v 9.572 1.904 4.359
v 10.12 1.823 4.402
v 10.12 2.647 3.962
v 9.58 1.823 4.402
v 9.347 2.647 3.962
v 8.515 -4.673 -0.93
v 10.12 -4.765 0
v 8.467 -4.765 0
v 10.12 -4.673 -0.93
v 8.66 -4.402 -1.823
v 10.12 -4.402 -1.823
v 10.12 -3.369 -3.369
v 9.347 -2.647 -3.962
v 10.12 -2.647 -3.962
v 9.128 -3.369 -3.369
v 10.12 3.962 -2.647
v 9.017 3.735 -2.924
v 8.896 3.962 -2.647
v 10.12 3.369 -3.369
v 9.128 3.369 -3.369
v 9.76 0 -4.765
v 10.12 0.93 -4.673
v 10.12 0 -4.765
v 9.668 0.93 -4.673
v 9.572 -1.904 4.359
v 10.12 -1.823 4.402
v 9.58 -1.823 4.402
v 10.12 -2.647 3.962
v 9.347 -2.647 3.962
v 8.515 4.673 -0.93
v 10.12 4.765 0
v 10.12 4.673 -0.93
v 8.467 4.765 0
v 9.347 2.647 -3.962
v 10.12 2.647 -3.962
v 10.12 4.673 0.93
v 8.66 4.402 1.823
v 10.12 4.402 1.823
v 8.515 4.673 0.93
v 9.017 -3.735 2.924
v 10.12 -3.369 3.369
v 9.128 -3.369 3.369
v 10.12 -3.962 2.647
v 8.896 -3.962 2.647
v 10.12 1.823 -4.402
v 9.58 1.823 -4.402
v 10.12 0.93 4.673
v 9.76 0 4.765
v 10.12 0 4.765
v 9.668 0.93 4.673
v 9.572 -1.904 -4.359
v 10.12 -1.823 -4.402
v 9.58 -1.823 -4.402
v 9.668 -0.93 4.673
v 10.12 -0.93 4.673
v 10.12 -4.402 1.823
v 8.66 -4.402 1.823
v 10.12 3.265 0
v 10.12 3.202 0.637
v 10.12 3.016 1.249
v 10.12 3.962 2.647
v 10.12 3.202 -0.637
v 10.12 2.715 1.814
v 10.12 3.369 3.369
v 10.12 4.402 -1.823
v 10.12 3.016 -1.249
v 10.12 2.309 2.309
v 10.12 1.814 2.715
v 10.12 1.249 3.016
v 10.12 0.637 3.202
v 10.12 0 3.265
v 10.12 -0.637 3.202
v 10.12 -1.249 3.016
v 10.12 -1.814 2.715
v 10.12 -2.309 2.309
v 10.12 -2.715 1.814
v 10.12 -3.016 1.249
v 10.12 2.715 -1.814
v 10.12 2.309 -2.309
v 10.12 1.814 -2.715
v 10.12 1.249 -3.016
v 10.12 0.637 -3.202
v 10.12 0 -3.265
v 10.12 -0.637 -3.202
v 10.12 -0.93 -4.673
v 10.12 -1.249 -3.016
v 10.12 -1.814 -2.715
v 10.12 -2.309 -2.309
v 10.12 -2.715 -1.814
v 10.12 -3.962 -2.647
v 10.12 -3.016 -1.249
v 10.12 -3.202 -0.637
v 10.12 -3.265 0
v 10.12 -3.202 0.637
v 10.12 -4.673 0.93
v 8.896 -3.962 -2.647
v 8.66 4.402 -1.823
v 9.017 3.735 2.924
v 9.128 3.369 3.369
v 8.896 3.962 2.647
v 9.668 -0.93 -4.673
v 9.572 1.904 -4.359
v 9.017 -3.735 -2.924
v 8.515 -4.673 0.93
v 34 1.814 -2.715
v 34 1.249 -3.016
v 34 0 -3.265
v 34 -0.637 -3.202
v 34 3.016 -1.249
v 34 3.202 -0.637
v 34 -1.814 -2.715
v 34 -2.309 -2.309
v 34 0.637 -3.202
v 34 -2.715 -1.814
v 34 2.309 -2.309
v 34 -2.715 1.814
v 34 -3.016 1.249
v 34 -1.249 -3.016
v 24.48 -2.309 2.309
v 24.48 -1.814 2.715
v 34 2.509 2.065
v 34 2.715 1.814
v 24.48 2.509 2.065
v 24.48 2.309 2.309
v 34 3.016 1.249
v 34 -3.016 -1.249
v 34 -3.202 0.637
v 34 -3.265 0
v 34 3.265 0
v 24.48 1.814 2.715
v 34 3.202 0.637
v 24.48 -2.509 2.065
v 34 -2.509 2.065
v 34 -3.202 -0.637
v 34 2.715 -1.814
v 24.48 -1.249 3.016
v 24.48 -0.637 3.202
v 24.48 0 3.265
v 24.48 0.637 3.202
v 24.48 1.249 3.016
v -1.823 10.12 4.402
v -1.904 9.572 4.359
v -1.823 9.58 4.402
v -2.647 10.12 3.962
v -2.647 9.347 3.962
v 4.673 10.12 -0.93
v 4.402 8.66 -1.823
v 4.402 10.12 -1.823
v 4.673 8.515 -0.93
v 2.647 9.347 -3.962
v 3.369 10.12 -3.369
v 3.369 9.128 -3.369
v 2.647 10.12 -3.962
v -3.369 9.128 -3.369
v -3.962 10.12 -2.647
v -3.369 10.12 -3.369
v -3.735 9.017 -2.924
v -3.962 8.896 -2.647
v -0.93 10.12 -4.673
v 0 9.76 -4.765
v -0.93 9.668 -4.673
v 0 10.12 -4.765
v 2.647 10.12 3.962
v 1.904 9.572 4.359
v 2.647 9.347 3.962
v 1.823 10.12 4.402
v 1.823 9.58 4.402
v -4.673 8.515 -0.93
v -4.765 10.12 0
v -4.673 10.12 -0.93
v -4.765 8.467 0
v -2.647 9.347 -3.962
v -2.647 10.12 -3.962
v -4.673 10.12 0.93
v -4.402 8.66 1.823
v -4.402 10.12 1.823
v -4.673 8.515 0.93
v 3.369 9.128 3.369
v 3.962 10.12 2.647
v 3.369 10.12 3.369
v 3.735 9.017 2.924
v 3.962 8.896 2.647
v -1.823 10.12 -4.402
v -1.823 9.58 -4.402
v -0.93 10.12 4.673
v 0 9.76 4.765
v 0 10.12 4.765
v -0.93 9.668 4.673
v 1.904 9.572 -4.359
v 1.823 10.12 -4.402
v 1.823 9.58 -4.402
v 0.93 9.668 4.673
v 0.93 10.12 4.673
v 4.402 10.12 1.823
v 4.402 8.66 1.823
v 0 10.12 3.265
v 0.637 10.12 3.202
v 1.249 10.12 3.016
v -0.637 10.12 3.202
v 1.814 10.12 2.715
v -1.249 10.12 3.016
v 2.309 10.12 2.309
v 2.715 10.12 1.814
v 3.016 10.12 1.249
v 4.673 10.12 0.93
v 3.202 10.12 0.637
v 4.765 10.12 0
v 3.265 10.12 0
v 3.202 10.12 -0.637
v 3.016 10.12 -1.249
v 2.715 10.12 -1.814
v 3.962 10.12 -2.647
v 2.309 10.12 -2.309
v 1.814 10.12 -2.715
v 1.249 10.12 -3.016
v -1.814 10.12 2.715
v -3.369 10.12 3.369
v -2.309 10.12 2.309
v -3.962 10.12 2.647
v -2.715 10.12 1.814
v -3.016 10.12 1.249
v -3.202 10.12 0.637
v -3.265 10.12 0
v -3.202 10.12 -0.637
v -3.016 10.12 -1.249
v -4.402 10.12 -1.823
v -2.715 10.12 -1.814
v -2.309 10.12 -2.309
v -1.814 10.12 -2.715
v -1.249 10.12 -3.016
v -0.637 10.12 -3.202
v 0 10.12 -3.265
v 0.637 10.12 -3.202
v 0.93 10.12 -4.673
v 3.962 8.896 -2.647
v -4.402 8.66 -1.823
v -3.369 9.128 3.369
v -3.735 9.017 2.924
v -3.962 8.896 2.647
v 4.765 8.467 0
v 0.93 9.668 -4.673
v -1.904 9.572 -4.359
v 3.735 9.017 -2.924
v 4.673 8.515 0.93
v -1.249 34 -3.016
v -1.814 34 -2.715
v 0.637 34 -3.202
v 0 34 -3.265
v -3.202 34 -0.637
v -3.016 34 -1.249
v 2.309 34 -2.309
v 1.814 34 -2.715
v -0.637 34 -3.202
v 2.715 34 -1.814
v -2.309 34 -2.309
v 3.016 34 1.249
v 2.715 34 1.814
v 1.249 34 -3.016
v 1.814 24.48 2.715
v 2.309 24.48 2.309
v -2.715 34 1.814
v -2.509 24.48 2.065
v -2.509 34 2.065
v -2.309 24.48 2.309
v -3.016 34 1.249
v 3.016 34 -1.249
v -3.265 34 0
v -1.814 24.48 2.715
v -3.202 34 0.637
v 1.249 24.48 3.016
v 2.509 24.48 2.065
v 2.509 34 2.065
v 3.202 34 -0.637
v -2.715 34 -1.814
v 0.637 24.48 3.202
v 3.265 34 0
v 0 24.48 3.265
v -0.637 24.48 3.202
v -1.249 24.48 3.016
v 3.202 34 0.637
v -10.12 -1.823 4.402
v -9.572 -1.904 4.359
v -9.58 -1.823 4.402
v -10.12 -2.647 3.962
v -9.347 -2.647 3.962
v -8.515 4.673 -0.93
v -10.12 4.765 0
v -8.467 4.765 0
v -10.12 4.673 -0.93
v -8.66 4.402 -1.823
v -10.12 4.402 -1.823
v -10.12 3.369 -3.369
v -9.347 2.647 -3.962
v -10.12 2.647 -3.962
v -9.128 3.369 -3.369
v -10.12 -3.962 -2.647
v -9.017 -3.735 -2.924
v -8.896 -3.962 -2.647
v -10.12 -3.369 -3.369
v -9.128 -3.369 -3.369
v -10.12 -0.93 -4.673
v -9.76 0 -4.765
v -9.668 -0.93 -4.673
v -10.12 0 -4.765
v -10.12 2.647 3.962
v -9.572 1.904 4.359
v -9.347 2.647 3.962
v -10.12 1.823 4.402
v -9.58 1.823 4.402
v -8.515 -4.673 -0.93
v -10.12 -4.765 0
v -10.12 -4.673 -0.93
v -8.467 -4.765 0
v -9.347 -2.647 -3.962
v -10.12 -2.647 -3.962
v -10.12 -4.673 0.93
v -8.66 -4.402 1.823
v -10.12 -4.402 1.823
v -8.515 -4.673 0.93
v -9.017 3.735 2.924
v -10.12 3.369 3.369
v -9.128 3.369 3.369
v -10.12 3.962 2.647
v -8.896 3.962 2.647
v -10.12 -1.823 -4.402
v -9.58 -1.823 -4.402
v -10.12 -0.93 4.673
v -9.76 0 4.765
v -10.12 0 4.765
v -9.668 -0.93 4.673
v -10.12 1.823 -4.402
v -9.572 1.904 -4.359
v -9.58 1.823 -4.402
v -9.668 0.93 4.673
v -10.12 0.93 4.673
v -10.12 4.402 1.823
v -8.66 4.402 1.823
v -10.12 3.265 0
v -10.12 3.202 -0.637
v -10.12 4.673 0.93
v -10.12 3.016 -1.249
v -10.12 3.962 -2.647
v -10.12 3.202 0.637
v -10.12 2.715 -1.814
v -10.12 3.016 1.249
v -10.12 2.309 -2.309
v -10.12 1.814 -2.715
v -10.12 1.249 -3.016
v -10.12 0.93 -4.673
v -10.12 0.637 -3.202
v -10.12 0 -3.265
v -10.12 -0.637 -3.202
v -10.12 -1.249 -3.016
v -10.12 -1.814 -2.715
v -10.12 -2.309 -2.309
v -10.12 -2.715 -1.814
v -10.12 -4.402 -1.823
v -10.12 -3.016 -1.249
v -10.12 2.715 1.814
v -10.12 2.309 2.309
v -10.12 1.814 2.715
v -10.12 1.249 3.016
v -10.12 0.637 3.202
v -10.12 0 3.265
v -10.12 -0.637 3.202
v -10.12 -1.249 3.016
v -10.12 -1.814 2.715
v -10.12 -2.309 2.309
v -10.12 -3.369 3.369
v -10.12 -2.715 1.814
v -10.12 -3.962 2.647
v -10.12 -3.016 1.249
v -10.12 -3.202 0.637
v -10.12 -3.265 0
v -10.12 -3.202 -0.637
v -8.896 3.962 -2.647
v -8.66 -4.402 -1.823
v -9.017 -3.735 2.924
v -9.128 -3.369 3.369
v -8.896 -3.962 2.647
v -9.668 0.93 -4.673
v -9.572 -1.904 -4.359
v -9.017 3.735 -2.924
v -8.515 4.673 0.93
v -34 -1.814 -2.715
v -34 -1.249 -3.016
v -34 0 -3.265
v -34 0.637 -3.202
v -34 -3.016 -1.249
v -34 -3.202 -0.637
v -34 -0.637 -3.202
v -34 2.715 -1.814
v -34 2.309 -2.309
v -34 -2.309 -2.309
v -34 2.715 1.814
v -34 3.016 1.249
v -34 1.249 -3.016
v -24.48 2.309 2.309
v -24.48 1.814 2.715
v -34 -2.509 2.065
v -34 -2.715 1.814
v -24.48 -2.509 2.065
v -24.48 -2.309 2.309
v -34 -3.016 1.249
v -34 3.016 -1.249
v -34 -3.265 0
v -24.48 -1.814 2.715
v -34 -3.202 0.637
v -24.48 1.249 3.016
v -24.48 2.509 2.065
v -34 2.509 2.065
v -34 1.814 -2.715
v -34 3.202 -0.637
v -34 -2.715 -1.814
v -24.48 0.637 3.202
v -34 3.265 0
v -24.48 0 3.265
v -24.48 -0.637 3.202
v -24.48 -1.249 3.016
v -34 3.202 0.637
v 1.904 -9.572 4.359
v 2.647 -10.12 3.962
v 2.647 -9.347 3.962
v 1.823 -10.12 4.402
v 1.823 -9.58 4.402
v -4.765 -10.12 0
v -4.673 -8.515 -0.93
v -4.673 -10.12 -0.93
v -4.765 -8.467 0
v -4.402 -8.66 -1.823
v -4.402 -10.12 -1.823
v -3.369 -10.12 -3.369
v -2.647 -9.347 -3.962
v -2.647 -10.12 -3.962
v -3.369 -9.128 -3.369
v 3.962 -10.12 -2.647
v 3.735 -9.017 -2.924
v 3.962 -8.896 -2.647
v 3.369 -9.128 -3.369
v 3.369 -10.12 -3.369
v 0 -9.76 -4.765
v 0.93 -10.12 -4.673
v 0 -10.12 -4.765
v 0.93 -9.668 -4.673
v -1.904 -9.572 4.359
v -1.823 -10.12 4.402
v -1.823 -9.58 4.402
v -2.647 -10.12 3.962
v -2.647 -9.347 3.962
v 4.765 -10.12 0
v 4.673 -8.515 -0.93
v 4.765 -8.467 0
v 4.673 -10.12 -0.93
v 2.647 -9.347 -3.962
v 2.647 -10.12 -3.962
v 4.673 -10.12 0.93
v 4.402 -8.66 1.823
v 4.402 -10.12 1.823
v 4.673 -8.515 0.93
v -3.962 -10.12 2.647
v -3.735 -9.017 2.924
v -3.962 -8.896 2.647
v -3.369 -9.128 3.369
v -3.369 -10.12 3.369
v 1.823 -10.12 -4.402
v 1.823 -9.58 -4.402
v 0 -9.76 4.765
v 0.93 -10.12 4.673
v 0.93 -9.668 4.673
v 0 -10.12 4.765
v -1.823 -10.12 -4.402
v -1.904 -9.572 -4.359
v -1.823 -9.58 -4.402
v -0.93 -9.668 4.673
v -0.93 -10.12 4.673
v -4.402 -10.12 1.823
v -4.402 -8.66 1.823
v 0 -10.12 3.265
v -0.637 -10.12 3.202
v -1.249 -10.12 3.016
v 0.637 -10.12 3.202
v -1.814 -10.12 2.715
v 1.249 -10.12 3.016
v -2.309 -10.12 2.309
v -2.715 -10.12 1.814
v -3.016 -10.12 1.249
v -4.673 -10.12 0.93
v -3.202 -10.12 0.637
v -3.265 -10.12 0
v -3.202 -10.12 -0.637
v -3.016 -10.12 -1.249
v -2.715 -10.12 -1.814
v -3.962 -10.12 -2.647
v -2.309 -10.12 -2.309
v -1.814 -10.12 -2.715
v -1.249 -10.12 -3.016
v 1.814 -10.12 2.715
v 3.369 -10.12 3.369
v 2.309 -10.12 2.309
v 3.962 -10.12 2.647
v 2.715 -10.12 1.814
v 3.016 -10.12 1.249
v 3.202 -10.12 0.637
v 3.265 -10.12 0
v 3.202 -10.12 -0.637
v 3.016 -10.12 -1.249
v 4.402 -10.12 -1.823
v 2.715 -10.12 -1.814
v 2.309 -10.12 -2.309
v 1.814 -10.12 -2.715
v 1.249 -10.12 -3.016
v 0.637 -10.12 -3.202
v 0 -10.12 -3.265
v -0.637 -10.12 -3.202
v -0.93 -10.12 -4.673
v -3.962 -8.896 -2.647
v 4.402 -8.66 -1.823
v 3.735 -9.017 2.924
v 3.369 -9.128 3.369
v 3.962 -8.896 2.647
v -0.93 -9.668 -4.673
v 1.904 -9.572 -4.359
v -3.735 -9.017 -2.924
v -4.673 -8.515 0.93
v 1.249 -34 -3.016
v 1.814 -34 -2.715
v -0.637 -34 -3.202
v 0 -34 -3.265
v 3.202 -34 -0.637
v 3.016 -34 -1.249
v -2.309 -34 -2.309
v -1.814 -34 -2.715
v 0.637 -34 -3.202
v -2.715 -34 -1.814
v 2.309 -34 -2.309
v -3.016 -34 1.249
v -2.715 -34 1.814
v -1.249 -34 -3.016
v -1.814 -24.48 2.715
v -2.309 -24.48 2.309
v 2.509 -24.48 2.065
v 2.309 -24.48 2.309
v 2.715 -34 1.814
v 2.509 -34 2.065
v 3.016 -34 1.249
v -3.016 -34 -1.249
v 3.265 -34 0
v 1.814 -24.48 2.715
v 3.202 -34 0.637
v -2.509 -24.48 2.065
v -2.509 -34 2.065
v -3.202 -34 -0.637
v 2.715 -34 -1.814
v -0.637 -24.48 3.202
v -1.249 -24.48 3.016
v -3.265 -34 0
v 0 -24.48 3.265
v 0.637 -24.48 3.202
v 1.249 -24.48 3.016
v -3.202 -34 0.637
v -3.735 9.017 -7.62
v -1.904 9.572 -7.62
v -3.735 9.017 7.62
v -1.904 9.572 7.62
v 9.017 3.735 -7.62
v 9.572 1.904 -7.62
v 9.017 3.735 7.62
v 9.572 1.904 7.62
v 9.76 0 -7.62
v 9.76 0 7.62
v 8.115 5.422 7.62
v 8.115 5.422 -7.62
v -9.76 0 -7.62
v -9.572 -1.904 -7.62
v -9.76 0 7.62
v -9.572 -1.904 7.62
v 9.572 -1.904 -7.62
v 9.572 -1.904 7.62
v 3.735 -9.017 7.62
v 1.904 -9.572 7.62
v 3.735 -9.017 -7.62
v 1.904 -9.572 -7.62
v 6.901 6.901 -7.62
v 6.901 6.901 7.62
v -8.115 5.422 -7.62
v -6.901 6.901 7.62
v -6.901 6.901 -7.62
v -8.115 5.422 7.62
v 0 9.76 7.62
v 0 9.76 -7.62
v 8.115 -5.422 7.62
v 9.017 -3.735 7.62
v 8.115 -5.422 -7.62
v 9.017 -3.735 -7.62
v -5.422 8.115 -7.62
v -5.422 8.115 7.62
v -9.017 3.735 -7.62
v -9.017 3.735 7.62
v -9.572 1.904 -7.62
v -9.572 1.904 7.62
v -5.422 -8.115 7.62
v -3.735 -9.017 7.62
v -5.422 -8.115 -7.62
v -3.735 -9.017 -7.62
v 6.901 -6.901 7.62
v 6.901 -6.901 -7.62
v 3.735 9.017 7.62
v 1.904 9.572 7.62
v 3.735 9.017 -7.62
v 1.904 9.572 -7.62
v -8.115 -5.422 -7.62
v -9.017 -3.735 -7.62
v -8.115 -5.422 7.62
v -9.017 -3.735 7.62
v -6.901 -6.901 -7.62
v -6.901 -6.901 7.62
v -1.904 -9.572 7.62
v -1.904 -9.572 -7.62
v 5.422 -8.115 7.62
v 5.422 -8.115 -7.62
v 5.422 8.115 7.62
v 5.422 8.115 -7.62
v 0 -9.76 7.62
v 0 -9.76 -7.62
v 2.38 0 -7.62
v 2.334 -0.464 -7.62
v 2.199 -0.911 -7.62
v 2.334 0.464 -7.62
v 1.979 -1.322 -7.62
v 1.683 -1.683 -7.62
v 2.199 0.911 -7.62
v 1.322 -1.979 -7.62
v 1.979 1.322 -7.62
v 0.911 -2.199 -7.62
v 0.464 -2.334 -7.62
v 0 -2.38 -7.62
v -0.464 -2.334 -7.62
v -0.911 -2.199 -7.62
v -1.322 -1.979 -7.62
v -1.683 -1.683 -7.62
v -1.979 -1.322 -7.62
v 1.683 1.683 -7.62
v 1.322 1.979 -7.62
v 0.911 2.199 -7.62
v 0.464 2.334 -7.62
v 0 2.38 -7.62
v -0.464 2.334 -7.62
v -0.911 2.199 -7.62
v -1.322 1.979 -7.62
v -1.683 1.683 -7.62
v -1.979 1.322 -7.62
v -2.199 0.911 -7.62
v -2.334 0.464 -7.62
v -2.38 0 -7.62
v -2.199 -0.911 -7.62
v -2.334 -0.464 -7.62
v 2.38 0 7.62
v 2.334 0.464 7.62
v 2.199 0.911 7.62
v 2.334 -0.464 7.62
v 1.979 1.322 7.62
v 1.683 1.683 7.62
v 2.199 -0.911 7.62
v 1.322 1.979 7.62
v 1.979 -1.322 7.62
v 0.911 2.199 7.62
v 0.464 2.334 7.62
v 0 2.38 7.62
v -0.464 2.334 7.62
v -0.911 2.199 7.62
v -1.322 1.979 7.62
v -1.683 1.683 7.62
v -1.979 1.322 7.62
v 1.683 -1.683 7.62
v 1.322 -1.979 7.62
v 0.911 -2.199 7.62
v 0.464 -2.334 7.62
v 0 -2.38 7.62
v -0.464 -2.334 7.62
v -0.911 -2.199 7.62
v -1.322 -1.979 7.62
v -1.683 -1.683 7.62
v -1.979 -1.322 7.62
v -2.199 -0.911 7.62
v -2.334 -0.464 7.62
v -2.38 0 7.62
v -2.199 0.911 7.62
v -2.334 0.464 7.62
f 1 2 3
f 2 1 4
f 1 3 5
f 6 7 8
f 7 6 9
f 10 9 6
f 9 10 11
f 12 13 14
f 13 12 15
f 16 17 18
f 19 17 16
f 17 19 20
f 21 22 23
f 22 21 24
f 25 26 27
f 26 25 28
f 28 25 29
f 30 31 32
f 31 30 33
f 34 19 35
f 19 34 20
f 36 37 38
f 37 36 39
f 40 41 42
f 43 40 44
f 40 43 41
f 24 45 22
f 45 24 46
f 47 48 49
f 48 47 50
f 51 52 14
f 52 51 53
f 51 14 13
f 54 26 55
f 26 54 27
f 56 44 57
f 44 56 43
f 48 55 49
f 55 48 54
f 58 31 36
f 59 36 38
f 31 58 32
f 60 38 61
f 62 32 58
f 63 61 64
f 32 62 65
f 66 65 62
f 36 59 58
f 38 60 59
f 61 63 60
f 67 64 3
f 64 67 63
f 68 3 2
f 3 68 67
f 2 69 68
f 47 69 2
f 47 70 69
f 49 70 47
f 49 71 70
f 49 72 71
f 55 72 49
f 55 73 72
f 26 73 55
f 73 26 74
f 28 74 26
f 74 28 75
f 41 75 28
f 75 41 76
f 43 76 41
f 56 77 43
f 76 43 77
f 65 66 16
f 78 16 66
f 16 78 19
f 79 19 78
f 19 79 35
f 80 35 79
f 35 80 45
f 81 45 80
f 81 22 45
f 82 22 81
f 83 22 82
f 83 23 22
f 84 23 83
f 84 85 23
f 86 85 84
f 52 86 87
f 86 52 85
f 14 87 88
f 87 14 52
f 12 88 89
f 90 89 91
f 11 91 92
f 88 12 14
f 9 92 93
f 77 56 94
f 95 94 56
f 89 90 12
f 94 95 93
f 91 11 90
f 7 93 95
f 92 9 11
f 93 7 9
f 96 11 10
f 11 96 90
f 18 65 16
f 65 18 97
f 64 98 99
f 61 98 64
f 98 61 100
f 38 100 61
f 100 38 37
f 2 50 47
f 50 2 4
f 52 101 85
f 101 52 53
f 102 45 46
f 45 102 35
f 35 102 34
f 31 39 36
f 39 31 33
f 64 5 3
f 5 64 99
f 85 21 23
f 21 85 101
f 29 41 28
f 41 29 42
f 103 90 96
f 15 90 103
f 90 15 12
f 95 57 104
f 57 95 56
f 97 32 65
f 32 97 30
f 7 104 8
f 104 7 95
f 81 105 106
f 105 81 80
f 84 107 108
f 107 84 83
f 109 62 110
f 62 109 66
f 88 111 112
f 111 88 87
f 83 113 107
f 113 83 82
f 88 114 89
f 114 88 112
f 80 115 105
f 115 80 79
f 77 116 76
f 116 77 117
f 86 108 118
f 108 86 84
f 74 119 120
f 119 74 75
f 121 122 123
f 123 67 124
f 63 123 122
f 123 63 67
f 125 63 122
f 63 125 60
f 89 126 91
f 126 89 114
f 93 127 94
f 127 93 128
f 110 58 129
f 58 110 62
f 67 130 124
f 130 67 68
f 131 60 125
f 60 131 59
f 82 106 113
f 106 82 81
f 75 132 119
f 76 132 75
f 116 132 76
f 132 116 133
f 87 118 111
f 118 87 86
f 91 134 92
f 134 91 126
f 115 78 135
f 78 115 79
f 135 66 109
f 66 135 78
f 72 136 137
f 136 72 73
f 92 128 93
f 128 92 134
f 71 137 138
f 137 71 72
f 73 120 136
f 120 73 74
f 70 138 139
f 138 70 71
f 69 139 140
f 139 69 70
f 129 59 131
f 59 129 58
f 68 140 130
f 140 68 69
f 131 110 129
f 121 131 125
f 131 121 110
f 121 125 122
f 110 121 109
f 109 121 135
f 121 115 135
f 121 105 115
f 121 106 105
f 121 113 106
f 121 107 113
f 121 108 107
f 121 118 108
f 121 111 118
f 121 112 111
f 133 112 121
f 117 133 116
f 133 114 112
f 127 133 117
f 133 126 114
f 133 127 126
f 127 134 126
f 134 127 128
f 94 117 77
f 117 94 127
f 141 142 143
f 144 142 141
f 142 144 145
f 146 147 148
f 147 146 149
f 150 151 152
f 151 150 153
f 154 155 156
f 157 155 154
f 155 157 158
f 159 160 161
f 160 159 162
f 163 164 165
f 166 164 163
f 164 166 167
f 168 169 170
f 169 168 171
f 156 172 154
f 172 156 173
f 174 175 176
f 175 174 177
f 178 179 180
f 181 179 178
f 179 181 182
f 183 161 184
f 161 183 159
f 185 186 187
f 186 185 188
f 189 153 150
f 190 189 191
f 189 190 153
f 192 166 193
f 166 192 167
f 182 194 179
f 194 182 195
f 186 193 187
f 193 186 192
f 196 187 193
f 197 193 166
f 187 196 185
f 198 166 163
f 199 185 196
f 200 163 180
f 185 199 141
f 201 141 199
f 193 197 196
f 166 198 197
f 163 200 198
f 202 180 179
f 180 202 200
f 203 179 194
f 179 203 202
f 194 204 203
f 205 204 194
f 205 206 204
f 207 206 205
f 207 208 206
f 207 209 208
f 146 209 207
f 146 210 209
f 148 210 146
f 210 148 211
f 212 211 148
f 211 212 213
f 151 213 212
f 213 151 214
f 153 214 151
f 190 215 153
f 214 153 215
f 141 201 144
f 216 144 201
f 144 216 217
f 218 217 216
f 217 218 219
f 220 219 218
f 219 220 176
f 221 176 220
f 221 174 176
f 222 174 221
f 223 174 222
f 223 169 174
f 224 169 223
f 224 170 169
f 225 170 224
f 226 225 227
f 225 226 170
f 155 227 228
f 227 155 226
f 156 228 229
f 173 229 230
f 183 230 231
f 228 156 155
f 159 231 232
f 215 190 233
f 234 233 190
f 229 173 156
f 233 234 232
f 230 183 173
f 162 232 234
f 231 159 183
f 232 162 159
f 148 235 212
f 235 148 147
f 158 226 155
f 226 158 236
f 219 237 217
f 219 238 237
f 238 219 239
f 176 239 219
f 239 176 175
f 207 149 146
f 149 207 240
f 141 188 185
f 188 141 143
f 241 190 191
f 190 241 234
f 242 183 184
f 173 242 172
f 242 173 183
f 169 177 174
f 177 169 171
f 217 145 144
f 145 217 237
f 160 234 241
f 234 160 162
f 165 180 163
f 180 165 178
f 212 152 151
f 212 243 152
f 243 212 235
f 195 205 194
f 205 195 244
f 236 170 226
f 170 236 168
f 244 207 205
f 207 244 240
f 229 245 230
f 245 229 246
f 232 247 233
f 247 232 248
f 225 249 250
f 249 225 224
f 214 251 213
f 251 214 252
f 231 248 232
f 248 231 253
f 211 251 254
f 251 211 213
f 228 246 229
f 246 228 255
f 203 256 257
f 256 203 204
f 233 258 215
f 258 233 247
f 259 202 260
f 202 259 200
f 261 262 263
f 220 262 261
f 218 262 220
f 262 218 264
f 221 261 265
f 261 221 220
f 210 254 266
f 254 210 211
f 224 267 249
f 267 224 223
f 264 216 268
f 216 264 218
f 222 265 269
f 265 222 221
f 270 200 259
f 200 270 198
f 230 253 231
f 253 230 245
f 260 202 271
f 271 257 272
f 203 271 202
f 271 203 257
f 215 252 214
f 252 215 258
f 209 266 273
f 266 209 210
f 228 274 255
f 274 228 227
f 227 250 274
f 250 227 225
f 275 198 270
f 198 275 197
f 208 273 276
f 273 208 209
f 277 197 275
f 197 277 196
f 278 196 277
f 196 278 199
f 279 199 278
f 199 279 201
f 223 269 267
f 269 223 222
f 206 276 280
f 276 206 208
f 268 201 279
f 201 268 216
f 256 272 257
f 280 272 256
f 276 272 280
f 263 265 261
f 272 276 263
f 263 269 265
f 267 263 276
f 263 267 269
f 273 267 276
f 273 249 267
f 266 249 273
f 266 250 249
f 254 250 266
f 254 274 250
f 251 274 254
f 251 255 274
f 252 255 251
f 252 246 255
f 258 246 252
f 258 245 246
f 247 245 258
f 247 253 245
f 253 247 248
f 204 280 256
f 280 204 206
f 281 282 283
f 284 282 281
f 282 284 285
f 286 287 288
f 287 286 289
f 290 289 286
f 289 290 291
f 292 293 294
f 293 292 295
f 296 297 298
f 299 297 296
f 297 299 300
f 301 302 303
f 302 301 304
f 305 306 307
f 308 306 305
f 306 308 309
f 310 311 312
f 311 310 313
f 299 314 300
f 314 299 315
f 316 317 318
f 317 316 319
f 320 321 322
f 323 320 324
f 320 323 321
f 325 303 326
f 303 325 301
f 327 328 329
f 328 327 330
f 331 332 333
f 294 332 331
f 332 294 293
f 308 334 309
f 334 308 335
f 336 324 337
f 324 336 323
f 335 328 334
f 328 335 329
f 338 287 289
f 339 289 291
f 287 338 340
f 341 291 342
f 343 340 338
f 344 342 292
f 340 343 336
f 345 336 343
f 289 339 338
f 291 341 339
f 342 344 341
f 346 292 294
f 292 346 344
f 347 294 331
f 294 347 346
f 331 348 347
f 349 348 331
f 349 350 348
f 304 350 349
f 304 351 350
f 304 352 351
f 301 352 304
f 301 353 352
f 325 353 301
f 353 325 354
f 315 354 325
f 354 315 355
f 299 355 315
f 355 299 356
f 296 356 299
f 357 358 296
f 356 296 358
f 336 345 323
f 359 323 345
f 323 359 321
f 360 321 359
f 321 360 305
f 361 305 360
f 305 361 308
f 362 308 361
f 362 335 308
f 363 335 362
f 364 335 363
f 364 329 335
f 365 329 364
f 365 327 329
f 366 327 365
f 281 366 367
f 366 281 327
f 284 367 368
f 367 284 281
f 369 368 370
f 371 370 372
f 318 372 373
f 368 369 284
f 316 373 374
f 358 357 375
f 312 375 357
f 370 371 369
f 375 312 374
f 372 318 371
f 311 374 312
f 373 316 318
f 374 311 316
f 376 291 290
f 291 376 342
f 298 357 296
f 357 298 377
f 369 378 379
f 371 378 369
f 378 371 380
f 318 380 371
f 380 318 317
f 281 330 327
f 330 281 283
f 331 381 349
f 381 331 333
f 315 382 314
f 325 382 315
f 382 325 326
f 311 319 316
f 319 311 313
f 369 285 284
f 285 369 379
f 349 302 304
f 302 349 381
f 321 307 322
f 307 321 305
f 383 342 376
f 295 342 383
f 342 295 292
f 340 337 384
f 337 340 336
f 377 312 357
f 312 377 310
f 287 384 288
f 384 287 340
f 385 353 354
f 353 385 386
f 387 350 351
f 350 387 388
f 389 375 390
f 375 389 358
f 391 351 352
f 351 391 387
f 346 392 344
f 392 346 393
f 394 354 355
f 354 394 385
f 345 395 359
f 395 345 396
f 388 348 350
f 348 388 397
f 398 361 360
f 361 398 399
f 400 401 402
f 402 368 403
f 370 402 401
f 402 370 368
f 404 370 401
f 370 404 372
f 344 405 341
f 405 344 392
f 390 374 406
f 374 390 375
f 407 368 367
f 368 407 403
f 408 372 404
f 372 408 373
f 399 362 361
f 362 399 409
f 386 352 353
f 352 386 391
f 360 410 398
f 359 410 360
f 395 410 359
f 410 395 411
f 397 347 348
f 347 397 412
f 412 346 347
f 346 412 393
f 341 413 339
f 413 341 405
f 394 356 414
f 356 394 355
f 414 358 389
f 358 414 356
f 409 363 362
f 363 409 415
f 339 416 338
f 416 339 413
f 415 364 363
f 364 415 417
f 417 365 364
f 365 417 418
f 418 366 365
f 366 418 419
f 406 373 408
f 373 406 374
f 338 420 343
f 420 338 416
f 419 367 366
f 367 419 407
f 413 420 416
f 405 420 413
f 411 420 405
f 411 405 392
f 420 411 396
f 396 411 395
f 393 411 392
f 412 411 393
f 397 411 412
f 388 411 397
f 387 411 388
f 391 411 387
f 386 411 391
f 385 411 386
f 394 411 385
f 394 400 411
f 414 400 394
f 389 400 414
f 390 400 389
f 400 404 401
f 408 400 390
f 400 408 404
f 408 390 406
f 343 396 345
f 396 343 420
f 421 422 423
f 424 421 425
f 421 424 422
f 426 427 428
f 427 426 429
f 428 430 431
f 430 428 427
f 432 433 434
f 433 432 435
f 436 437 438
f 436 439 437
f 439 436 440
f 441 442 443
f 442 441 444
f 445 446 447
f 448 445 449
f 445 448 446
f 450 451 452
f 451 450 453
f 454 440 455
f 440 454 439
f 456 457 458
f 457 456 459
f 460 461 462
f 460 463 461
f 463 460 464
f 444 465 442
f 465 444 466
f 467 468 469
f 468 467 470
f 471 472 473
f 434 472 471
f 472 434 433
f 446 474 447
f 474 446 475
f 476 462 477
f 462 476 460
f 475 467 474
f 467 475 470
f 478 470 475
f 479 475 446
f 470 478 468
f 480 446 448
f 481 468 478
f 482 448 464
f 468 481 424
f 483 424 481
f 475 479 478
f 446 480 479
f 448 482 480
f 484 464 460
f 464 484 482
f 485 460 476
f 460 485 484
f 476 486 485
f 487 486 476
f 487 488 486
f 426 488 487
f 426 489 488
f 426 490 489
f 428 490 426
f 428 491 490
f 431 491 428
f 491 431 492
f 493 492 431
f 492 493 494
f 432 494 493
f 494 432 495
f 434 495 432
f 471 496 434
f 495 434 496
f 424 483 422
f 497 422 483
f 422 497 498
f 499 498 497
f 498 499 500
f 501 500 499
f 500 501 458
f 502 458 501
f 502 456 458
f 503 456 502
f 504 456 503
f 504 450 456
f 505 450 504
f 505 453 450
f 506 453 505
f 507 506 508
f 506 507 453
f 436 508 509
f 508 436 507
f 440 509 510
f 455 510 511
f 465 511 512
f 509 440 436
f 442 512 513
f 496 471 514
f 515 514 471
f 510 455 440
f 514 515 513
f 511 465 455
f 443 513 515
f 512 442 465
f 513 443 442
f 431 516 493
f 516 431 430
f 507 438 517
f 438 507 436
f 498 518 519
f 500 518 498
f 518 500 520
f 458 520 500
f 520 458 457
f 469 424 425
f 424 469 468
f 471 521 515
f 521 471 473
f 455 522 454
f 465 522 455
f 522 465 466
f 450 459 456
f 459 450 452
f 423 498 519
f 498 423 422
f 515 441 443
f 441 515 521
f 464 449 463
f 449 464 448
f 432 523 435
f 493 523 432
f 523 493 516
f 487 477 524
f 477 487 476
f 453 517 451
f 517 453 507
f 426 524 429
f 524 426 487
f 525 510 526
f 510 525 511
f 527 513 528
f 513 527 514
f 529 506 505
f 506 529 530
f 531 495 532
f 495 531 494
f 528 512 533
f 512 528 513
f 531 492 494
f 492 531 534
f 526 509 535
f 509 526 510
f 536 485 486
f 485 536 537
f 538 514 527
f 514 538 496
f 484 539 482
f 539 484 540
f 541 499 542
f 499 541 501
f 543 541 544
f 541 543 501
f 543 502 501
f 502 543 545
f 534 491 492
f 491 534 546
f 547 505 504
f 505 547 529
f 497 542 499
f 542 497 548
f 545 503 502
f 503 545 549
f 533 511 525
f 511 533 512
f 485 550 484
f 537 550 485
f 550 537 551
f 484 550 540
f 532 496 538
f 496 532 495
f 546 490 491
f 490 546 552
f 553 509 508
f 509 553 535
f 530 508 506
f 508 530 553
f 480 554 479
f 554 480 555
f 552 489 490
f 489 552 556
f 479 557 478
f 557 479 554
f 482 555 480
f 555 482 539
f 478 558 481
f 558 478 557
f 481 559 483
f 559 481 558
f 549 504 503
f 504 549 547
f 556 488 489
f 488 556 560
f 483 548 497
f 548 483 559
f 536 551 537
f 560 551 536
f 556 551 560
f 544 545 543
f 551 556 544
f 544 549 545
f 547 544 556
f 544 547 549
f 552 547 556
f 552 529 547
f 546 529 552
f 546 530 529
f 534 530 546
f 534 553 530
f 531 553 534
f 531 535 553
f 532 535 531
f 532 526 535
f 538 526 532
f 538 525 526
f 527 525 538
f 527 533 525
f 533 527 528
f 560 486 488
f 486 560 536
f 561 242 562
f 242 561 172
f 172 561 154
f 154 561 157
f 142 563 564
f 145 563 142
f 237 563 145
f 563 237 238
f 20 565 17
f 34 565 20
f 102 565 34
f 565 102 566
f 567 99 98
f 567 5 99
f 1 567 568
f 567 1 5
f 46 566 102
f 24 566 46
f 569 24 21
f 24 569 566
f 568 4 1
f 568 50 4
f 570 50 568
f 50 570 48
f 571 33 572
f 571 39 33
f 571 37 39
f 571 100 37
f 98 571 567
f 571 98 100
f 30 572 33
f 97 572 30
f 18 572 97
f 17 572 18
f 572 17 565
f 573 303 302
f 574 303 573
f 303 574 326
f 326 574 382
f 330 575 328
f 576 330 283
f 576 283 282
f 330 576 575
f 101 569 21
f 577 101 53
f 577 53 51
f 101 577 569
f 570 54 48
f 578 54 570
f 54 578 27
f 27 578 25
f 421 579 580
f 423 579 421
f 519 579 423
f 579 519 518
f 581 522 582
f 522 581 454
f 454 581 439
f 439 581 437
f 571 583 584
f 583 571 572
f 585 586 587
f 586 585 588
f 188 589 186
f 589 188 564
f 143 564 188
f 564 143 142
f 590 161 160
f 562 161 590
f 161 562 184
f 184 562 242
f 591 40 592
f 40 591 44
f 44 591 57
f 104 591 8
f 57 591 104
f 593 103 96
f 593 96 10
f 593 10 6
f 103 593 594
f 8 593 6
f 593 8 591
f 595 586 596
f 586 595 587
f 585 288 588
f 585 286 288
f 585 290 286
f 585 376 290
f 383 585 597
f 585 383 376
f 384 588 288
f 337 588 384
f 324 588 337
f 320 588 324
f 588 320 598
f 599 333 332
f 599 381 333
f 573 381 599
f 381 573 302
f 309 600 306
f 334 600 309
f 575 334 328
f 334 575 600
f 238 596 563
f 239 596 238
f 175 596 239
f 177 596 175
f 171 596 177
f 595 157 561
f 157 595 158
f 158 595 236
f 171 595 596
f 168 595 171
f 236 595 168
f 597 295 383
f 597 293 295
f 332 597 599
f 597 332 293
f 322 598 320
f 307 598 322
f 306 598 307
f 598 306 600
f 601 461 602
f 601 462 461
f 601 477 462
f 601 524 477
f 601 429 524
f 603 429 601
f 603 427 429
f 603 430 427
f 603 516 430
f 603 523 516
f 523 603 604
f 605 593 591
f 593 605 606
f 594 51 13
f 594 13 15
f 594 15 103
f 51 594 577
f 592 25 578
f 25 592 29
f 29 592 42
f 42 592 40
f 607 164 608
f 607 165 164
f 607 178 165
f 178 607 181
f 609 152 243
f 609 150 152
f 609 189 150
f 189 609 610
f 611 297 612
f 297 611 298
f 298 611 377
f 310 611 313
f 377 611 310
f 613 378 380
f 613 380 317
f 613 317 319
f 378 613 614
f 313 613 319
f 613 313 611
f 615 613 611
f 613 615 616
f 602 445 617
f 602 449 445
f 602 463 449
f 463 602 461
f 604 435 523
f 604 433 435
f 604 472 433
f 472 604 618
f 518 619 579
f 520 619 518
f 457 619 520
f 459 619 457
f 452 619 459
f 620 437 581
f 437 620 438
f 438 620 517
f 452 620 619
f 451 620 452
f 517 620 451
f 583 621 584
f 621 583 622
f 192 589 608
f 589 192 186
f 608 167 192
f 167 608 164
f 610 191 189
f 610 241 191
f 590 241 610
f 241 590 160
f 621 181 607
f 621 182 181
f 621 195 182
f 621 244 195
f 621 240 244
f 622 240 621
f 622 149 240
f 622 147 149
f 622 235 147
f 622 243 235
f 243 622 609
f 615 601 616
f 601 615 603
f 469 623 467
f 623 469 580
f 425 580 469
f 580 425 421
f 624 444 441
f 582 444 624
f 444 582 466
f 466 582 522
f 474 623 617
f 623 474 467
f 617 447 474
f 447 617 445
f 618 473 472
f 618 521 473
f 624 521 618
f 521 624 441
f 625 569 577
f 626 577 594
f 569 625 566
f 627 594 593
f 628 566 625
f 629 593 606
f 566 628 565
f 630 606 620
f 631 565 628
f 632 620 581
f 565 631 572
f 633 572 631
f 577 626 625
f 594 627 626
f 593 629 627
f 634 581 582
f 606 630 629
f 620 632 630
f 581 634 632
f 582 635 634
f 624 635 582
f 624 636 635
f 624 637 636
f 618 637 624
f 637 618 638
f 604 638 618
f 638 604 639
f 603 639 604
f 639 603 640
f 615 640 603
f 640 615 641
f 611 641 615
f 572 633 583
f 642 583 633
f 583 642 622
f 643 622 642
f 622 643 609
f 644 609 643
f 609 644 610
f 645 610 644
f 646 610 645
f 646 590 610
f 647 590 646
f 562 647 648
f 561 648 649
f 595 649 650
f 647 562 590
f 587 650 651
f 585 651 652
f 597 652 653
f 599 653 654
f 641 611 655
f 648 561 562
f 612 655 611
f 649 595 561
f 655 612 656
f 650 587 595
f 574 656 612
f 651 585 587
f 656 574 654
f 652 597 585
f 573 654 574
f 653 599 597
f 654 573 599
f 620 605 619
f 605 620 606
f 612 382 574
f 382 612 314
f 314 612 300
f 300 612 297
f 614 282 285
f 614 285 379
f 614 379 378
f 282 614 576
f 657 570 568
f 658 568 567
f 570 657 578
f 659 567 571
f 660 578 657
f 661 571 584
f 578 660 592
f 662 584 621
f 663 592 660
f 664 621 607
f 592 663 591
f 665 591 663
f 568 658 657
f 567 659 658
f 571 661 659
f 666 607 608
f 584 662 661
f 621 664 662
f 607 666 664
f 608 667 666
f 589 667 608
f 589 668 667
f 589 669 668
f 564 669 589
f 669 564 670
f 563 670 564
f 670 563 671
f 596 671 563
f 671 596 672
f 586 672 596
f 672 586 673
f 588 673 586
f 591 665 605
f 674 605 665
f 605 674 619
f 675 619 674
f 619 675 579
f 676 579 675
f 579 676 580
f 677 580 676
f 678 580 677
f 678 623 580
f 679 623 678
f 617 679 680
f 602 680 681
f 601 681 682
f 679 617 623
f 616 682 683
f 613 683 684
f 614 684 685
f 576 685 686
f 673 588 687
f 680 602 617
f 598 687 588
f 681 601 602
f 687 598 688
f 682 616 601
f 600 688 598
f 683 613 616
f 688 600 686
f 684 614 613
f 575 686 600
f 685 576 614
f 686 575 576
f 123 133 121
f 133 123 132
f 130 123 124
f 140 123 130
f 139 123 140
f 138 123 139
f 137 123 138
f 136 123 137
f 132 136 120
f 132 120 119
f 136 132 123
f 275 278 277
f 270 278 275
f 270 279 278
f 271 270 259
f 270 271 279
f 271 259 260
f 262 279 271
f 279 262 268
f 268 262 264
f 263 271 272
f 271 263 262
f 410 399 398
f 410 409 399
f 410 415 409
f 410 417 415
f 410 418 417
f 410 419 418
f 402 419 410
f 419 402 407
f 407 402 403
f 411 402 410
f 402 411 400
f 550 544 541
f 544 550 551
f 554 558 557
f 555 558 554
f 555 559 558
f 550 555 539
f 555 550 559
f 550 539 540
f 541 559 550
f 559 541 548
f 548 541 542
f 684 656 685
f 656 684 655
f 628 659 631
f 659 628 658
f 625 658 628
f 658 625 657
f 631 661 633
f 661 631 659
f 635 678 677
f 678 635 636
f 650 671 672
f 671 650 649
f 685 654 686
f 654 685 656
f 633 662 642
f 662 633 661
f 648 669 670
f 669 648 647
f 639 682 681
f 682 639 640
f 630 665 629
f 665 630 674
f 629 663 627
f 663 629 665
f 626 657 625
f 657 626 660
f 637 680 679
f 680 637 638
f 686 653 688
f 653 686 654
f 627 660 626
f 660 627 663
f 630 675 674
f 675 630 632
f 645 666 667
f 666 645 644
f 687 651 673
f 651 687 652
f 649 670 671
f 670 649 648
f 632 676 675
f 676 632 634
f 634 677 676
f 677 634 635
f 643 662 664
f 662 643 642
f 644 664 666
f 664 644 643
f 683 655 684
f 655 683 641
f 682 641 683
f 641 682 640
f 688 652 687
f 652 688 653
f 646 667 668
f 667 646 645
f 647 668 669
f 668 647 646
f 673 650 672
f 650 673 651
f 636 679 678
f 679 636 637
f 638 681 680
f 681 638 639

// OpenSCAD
$fn = 32;

// ----------------------------------------------------------------------
// Cardan cross: 68 mm span, 9.53 mm trunnions
// ----------------------------------------------------------------------

// --- parameters (mm) ---
journal_d = 9.53;         // trunnion diameter
arm_len = 34;             // trunnion length from the centre
step_r = 3.24;            // step position from the centre
step_d = 6.53;            // journal diameter after the step
hub_d = 19.52;            // hub diameter
hub_h = 15.24;            // hub height
bore_d = 4.76;            // hub bore
flat_d = 1.2;             // depth of the journal flat
flat_len = 9.52;          // length of the journal flat

difference() {
  union() {
    /* hub along the joint axis */
    cylinder(h = hub_h, d = hub_d, center = true);
    for (a = [0 : 90 : 270]) rotate([0, 0, a]) {
      /* trunnion, sunk into the hub */
      translate([hub_d / 4, 0, 0]) rotate([0, 90, 0]) cylinder(h = step_r + 2, d = journal_d);
      /* stepped journal out to the tip */
      translate([step_r - 0.5, 0, 0]) rotate([0, 90, 0]) cylinder(h = arm_len + 0.5 - step_r, d = step_d);
    }
  }
  /* lubrication bore through the hub, 2.5 mm clear on both sides */
  translate([0, 0, -hub_h / 2 - 2.5]) cylinder(h = hub_h + 5, d = bore_d);
  /* machined flat on each journal tip */
  for (a = [0 : 90 : 270]) rotate([0, 0, a]) {
    translate([arm_len - flat_len, -step_d, step_d / 2 - flat_d]) cube([flat_len + 0.5, 2 * step_d, flat_d + 2.5]);
  }
}
